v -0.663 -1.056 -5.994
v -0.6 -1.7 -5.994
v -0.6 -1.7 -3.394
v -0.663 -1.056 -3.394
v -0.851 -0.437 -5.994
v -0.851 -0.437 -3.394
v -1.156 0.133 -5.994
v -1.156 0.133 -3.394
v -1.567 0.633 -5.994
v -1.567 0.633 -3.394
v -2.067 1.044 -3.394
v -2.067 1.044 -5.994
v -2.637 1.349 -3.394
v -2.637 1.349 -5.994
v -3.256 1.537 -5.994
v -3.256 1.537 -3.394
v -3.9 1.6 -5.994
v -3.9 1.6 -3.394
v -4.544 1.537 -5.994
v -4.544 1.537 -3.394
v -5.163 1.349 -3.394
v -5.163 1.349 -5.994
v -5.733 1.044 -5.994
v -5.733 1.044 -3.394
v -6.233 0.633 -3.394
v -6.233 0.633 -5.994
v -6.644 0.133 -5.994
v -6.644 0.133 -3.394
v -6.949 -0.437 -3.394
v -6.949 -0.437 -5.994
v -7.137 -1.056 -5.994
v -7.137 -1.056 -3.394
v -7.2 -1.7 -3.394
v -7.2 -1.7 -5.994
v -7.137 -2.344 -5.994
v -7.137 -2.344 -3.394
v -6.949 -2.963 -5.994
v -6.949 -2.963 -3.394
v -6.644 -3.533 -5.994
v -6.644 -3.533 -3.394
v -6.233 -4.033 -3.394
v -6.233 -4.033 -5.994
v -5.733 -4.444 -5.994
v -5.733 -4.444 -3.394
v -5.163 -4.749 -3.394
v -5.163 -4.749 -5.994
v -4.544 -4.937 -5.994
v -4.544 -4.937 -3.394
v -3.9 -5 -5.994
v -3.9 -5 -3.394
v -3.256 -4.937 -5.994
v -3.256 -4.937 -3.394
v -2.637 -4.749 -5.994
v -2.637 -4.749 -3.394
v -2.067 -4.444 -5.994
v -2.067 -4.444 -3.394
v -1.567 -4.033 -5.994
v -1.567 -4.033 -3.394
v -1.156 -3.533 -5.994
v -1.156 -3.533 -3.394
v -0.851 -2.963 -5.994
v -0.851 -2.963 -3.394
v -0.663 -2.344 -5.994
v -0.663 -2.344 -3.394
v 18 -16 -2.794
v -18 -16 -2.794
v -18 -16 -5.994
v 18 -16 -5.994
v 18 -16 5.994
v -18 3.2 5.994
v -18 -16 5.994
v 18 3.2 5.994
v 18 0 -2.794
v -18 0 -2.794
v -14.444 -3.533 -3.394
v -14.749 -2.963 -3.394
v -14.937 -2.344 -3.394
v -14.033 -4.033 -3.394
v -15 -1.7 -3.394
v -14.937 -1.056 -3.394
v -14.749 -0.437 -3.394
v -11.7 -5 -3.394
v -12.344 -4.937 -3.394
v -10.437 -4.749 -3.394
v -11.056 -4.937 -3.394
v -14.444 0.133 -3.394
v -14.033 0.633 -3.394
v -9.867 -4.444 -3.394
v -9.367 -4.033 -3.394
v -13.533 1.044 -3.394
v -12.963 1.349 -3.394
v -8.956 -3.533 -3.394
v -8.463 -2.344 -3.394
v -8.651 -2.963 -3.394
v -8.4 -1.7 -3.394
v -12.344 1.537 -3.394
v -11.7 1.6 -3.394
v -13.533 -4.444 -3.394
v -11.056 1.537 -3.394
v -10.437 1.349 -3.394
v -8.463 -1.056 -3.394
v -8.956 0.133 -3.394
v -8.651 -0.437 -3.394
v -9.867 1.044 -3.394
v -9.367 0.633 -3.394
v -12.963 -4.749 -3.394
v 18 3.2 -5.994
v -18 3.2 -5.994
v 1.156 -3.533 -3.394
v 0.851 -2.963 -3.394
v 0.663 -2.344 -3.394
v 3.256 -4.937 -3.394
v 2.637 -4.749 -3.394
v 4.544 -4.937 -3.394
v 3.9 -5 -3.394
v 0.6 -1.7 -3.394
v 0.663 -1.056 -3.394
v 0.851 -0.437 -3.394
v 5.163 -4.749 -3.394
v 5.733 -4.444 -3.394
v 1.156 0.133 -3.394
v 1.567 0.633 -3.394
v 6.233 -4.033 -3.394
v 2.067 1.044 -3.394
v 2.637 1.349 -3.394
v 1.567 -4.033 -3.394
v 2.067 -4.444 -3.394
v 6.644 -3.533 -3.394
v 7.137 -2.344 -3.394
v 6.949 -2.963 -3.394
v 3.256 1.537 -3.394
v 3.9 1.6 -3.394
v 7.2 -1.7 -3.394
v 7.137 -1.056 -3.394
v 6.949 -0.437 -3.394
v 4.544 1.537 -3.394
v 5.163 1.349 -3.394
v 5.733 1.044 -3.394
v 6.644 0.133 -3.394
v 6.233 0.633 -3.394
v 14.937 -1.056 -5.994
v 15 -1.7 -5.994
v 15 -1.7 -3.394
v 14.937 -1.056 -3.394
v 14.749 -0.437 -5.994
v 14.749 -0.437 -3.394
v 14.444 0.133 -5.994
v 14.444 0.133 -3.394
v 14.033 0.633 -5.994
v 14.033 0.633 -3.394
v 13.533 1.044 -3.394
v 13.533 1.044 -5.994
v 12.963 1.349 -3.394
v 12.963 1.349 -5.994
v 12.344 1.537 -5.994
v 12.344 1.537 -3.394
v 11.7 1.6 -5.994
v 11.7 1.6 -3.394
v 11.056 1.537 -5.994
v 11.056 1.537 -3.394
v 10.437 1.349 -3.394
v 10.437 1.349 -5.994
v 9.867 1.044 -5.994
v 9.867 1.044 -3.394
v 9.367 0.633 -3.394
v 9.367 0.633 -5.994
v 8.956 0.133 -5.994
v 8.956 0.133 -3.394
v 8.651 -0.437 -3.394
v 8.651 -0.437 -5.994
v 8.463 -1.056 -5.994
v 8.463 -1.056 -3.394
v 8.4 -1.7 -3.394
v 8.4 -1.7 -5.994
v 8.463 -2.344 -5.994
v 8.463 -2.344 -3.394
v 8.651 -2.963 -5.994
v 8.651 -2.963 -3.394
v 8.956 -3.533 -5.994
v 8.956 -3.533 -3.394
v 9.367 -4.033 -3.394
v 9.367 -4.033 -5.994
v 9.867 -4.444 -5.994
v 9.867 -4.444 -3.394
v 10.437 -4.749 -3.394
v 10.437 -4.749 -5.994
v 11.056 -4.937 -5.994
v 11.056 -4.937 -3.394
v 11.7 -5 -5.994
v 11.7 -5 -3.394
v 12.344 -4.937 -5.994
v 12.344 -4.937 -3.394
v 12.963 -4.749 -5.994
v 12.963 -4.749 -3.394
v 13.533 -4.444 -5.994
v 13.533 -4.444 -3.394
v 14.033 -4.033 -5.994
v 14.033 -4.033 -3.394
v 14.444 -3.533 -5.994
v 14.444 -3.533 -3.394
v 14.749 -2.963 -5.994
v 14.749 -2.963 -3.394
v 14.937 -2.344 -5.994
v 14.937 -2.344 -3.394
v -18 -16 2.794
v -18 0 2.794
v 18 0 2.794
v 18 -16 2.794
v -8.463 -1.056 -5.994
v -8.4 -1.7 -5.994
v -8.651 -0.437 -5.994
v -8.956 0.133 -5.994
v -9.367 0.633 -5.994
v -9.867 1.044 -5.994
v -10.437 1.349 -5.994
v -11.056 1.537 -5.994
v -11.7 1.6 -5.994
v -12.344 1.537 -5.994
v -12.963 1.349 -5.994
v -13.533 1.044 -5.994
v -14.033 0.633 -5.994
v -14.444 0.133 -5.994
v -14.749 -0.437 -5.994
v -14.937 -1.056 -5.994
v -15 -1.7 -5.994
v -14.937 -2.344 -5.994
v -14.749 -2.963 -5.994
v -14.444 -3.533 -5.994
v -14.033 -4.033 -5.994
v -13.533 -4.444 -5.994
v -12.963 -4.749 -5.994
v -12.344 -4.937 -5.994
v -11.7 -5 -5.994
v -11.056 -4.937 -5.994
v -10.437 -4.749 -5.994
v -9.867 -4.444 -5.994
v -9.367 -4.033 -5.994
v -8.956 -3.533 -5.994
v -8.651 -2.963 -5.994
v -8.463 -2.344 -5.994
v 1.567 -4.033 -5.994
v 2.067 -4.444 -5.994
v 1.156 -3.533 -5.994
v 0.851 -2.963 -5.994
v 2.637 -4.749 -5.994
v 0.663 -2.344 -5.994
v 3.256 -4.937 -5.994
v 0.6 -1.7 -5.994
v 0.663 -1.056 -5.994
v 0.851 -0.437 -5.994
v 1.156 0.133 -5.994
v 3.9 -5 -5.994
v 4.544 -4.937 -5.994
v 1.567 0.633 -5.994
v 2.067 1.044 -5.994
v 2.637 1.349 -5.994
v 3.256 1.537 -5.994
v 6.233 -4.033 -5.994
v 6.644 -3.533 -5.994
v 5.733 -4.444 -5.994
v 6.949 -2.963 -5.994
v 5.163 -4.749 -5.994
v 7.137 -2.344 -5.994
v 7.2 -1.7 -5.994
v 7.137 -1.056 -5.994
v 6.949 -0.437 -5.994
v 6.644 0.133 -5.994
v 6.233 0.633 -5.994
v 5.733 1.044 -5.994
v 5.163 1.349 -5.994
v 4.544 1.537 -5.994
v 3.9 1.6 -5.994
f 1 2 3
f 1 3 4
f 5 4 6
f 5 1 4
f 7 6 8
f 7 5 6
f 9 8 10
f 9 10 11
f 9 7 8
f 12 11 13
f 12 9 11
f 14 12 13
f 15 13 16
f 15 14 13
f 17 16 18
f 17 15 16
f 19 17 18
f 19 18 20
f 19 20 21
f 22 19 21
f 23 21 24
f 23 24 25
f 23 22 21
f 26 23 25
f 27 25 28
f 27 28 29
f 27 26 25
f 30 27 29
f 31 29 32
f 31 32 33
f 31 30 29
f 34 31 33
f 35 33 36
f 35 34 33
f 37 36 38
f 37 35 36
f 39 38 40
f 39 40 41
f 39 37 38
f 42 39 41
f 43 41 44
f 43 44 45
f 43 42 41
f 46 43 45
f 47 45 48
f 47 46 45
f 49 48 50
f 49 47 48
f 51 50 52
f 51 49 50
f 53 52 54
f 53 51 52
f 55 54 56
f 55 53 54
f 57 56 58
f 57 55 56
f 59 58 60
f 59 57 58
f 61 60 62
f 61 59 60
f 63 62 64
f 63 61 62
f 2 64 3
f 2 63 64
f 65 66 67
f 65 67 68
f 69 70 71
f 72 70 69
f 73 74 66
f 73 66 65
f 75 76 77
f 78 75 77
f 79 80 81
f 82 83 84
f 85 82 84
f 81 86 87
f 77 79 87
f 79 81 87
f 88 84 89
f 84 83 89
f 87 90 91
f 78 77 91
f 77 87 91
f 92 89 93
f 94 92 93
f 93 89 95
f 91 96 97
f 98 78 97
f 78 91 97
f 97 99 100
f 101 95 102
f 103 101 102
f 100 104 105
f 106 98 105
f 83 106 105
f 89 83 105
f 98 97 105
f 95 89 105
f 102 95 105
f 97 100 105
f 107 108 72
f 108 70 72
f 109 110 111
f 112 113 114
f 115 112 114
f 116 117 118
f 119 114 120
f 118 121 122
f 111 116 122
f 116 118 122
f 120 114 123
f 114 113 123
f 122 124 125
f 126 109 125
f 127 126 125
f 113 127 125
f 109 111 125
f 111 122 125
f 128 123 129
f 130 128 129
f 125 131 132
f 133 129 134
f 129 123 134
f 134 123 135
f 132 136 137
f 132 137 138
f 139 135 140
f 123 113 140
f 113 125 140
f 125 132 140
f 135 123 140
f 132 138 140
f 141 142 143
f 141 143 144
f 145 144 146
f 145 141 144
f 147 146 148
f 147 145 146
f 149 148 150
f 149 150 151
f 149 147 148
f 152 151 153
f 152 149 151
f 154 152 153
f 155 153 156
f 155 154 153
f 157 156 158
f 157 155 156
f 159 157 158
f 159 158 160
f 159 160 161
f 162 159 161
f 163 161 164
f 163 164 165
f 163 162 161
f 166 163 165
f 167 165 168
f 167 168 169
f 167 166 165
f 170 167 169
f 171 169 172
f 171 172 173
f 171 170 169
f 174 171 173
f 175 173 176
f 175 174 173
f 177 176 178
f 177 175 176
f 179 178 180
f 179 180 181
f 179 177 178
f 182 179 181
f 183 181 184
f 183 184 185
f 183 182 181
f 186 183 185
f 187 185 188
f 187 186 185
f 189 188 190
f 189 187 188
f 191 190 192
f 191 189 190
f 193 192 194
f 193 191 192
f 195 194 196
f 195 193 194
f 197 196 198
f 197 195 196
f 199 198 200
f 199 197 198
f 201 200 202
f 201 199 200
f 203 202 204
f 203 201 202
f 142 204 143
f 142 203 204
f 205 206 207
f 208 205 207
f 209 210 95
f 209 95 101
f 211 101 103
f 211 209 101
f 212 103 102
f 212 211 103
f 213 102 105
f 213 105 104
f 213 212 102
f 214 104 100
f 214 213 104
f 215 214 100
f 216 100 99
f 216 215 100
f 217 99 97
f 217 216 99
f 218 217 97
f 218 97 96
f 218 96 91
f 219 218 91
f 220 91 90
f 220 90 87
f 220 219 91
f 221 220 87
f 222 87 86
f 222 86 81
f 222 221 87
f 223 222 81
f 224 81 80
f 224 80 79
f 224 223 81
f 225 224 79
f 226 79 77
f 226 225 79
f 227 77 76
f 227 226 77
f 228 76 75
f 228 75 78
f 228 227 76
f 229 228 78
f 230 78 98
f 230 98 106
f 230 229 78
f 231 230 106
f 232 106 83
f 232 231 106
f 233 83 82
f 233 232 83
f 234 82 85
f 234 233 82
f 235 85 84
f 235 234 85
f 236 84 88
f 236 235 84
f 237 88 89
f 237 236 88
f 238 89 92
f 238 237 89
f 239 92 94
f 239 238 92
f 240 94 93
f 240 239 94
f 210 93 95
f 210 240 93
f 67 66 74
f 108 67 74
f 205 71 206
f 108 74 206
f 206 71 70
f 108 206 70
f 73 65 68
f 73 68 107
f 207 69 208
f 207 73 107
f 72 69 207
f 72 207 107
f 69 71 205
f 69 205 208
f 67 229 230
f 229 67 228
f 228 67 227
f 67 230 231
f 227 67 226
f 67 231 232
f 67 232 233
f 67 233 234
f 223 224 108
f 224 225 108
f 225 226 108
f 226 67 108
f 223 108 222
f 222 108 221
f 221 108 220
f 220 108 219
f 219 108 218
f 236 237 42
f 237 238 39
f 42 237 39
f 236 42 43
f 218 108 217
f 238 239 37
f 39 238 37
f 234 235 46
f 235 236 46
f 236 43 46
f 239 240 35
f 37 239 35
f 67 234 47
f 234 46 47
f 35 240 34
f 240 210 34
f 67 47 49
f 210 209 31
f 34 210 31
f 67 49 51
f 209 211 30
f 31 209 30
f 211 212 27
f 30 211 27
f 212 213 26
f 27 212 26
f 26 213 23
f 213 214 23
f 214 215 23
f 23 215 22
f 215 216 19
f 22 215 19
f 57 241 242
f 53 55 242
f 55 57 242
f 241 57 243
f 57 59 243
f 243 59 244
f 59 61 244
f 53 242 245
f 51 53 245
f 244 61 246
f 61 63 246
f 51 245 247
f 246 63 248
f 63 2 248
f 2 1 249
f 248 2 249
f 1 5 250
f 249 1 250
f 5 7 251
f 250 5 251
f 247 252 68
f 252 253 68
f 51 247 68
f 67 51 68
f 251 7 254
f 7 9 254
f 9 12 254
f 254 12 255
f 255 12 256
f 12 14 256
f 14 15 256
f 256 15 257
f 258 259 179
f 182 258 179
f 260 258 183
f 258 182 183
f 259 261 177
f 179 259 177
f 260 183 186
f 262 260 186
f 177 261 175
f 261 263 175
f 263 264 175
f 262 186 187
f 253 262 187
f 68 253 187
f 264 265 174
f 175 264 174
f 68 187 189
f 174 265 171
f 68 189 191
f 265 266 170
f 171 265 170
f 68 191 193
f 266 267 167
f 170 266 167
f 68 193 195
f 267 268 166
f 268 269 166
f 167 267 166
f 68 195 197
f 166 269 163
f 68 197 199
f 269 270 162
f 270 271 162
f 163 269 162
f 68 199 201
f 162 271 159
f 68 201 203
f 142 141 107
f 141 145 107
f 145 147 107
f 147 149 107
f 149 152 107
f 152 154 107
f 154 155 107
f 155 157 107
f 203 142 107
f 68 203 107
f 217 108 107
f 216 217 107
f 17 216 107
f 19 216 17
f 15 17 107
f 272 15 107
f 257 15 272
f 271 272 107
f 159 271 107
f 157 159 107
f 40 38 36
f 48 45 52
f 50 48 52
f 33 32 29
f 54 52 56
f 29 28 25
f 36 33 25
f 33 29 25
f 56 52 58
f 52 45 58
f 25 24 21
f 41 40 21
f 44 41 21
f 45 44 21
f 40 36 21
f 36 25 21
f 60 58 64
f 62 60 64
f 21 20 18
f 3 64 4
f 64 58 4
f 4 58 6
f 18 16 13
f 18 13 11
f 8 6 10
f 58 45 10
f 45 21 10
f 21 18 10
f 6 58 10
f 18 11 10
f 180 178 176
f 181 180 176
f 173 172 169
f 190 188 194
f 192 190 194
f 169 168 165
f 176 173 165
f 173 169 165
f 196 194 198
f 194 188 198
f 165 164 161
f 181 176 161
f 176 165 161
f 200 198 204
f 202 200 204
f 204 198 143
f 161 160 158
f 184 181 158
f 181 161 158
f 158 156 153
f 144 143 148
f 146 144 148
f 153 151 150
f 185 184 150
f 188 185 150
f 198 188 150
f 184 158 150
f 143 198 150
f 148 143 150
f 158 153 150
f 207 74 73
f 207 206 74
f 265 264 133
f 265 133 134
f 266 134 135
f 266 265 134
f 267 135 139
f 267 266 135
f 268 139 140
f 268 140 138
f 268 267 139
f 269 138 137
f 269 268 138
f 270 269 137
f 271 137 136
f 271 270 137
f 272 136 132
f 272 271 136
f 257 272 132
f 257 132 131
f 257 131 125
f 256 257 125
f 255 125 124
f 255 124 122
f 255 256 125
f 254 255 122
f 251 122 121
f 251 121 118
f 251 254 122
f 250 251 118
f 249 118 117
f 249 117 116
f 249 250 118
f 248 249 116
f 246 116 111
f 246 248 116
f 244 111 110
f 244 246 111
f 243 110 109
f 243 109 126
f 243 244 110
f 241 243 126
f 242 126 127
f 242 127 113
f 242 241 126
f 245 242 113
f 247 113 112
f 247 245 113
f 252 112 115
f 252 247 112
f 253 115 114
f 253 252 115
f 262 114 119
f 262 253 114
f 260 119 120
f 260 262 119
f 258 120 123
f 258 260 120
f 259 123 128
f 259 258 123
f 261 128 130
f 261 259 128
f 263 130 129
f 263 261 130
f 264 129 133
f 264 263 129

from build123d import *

# Parameters (mm, degrees)
SKETCH2_W           = 36
SKETCH2_H           = 19.2
BOSS_EXTRUDE1_DEPTH = 5.994
SKETCH3_W           = 36
SKETCH3_H           = 16
CUT_EXTRUDE1_DEPTH  = 2.794
SKETCH4_R           = 3.3
CUT_EXTRUDE2_DEPTH  = 2.6


with BuildPart() as part:
    # Sketch2 → Boss-Extrude1 (new, symmetric)
    with BuildSketch(Plane.XY):
        with Locations((0, -6.4)):
            Rectangle(SKETCH2_W, SKETCH2_H)
    extrude(amount=BOSS_EXTRUDE1_DEPTH, both=True)

    # Sketch3 → Cut-Extrude1 (cut, symmetric)
    with BuildSketch(Plane.XY):
        with Locations((0, -8)):
            Rectangle(SKETCH3_W, SKETCH3_H)
    extrude(amount=CUT_EXTRUDE1_DEPTH, both=True, mode=Mode.SUBTRACT)

    # Sketch4 → Cut-Extrude2 (cut)
    with BuildSketch(Plane.XY.offset(-5.994)):
        with Locations((11.7, -1.7)):
            Circle(SKETCH4_R)
        with Locations((3.9, -1.7)):
            Circle(SKETCH4_R)
        with Locations((-3.9, -1.7)):
            Circle(SKETCH4_R)
        with Locations((-11.7, -1.7)):
            Circle(SKETCH4_R)
    extrude(amount=CUT_EXTRUDE2_DEPTH, mode=Mode.SUBTRACT)


solid = part.part
